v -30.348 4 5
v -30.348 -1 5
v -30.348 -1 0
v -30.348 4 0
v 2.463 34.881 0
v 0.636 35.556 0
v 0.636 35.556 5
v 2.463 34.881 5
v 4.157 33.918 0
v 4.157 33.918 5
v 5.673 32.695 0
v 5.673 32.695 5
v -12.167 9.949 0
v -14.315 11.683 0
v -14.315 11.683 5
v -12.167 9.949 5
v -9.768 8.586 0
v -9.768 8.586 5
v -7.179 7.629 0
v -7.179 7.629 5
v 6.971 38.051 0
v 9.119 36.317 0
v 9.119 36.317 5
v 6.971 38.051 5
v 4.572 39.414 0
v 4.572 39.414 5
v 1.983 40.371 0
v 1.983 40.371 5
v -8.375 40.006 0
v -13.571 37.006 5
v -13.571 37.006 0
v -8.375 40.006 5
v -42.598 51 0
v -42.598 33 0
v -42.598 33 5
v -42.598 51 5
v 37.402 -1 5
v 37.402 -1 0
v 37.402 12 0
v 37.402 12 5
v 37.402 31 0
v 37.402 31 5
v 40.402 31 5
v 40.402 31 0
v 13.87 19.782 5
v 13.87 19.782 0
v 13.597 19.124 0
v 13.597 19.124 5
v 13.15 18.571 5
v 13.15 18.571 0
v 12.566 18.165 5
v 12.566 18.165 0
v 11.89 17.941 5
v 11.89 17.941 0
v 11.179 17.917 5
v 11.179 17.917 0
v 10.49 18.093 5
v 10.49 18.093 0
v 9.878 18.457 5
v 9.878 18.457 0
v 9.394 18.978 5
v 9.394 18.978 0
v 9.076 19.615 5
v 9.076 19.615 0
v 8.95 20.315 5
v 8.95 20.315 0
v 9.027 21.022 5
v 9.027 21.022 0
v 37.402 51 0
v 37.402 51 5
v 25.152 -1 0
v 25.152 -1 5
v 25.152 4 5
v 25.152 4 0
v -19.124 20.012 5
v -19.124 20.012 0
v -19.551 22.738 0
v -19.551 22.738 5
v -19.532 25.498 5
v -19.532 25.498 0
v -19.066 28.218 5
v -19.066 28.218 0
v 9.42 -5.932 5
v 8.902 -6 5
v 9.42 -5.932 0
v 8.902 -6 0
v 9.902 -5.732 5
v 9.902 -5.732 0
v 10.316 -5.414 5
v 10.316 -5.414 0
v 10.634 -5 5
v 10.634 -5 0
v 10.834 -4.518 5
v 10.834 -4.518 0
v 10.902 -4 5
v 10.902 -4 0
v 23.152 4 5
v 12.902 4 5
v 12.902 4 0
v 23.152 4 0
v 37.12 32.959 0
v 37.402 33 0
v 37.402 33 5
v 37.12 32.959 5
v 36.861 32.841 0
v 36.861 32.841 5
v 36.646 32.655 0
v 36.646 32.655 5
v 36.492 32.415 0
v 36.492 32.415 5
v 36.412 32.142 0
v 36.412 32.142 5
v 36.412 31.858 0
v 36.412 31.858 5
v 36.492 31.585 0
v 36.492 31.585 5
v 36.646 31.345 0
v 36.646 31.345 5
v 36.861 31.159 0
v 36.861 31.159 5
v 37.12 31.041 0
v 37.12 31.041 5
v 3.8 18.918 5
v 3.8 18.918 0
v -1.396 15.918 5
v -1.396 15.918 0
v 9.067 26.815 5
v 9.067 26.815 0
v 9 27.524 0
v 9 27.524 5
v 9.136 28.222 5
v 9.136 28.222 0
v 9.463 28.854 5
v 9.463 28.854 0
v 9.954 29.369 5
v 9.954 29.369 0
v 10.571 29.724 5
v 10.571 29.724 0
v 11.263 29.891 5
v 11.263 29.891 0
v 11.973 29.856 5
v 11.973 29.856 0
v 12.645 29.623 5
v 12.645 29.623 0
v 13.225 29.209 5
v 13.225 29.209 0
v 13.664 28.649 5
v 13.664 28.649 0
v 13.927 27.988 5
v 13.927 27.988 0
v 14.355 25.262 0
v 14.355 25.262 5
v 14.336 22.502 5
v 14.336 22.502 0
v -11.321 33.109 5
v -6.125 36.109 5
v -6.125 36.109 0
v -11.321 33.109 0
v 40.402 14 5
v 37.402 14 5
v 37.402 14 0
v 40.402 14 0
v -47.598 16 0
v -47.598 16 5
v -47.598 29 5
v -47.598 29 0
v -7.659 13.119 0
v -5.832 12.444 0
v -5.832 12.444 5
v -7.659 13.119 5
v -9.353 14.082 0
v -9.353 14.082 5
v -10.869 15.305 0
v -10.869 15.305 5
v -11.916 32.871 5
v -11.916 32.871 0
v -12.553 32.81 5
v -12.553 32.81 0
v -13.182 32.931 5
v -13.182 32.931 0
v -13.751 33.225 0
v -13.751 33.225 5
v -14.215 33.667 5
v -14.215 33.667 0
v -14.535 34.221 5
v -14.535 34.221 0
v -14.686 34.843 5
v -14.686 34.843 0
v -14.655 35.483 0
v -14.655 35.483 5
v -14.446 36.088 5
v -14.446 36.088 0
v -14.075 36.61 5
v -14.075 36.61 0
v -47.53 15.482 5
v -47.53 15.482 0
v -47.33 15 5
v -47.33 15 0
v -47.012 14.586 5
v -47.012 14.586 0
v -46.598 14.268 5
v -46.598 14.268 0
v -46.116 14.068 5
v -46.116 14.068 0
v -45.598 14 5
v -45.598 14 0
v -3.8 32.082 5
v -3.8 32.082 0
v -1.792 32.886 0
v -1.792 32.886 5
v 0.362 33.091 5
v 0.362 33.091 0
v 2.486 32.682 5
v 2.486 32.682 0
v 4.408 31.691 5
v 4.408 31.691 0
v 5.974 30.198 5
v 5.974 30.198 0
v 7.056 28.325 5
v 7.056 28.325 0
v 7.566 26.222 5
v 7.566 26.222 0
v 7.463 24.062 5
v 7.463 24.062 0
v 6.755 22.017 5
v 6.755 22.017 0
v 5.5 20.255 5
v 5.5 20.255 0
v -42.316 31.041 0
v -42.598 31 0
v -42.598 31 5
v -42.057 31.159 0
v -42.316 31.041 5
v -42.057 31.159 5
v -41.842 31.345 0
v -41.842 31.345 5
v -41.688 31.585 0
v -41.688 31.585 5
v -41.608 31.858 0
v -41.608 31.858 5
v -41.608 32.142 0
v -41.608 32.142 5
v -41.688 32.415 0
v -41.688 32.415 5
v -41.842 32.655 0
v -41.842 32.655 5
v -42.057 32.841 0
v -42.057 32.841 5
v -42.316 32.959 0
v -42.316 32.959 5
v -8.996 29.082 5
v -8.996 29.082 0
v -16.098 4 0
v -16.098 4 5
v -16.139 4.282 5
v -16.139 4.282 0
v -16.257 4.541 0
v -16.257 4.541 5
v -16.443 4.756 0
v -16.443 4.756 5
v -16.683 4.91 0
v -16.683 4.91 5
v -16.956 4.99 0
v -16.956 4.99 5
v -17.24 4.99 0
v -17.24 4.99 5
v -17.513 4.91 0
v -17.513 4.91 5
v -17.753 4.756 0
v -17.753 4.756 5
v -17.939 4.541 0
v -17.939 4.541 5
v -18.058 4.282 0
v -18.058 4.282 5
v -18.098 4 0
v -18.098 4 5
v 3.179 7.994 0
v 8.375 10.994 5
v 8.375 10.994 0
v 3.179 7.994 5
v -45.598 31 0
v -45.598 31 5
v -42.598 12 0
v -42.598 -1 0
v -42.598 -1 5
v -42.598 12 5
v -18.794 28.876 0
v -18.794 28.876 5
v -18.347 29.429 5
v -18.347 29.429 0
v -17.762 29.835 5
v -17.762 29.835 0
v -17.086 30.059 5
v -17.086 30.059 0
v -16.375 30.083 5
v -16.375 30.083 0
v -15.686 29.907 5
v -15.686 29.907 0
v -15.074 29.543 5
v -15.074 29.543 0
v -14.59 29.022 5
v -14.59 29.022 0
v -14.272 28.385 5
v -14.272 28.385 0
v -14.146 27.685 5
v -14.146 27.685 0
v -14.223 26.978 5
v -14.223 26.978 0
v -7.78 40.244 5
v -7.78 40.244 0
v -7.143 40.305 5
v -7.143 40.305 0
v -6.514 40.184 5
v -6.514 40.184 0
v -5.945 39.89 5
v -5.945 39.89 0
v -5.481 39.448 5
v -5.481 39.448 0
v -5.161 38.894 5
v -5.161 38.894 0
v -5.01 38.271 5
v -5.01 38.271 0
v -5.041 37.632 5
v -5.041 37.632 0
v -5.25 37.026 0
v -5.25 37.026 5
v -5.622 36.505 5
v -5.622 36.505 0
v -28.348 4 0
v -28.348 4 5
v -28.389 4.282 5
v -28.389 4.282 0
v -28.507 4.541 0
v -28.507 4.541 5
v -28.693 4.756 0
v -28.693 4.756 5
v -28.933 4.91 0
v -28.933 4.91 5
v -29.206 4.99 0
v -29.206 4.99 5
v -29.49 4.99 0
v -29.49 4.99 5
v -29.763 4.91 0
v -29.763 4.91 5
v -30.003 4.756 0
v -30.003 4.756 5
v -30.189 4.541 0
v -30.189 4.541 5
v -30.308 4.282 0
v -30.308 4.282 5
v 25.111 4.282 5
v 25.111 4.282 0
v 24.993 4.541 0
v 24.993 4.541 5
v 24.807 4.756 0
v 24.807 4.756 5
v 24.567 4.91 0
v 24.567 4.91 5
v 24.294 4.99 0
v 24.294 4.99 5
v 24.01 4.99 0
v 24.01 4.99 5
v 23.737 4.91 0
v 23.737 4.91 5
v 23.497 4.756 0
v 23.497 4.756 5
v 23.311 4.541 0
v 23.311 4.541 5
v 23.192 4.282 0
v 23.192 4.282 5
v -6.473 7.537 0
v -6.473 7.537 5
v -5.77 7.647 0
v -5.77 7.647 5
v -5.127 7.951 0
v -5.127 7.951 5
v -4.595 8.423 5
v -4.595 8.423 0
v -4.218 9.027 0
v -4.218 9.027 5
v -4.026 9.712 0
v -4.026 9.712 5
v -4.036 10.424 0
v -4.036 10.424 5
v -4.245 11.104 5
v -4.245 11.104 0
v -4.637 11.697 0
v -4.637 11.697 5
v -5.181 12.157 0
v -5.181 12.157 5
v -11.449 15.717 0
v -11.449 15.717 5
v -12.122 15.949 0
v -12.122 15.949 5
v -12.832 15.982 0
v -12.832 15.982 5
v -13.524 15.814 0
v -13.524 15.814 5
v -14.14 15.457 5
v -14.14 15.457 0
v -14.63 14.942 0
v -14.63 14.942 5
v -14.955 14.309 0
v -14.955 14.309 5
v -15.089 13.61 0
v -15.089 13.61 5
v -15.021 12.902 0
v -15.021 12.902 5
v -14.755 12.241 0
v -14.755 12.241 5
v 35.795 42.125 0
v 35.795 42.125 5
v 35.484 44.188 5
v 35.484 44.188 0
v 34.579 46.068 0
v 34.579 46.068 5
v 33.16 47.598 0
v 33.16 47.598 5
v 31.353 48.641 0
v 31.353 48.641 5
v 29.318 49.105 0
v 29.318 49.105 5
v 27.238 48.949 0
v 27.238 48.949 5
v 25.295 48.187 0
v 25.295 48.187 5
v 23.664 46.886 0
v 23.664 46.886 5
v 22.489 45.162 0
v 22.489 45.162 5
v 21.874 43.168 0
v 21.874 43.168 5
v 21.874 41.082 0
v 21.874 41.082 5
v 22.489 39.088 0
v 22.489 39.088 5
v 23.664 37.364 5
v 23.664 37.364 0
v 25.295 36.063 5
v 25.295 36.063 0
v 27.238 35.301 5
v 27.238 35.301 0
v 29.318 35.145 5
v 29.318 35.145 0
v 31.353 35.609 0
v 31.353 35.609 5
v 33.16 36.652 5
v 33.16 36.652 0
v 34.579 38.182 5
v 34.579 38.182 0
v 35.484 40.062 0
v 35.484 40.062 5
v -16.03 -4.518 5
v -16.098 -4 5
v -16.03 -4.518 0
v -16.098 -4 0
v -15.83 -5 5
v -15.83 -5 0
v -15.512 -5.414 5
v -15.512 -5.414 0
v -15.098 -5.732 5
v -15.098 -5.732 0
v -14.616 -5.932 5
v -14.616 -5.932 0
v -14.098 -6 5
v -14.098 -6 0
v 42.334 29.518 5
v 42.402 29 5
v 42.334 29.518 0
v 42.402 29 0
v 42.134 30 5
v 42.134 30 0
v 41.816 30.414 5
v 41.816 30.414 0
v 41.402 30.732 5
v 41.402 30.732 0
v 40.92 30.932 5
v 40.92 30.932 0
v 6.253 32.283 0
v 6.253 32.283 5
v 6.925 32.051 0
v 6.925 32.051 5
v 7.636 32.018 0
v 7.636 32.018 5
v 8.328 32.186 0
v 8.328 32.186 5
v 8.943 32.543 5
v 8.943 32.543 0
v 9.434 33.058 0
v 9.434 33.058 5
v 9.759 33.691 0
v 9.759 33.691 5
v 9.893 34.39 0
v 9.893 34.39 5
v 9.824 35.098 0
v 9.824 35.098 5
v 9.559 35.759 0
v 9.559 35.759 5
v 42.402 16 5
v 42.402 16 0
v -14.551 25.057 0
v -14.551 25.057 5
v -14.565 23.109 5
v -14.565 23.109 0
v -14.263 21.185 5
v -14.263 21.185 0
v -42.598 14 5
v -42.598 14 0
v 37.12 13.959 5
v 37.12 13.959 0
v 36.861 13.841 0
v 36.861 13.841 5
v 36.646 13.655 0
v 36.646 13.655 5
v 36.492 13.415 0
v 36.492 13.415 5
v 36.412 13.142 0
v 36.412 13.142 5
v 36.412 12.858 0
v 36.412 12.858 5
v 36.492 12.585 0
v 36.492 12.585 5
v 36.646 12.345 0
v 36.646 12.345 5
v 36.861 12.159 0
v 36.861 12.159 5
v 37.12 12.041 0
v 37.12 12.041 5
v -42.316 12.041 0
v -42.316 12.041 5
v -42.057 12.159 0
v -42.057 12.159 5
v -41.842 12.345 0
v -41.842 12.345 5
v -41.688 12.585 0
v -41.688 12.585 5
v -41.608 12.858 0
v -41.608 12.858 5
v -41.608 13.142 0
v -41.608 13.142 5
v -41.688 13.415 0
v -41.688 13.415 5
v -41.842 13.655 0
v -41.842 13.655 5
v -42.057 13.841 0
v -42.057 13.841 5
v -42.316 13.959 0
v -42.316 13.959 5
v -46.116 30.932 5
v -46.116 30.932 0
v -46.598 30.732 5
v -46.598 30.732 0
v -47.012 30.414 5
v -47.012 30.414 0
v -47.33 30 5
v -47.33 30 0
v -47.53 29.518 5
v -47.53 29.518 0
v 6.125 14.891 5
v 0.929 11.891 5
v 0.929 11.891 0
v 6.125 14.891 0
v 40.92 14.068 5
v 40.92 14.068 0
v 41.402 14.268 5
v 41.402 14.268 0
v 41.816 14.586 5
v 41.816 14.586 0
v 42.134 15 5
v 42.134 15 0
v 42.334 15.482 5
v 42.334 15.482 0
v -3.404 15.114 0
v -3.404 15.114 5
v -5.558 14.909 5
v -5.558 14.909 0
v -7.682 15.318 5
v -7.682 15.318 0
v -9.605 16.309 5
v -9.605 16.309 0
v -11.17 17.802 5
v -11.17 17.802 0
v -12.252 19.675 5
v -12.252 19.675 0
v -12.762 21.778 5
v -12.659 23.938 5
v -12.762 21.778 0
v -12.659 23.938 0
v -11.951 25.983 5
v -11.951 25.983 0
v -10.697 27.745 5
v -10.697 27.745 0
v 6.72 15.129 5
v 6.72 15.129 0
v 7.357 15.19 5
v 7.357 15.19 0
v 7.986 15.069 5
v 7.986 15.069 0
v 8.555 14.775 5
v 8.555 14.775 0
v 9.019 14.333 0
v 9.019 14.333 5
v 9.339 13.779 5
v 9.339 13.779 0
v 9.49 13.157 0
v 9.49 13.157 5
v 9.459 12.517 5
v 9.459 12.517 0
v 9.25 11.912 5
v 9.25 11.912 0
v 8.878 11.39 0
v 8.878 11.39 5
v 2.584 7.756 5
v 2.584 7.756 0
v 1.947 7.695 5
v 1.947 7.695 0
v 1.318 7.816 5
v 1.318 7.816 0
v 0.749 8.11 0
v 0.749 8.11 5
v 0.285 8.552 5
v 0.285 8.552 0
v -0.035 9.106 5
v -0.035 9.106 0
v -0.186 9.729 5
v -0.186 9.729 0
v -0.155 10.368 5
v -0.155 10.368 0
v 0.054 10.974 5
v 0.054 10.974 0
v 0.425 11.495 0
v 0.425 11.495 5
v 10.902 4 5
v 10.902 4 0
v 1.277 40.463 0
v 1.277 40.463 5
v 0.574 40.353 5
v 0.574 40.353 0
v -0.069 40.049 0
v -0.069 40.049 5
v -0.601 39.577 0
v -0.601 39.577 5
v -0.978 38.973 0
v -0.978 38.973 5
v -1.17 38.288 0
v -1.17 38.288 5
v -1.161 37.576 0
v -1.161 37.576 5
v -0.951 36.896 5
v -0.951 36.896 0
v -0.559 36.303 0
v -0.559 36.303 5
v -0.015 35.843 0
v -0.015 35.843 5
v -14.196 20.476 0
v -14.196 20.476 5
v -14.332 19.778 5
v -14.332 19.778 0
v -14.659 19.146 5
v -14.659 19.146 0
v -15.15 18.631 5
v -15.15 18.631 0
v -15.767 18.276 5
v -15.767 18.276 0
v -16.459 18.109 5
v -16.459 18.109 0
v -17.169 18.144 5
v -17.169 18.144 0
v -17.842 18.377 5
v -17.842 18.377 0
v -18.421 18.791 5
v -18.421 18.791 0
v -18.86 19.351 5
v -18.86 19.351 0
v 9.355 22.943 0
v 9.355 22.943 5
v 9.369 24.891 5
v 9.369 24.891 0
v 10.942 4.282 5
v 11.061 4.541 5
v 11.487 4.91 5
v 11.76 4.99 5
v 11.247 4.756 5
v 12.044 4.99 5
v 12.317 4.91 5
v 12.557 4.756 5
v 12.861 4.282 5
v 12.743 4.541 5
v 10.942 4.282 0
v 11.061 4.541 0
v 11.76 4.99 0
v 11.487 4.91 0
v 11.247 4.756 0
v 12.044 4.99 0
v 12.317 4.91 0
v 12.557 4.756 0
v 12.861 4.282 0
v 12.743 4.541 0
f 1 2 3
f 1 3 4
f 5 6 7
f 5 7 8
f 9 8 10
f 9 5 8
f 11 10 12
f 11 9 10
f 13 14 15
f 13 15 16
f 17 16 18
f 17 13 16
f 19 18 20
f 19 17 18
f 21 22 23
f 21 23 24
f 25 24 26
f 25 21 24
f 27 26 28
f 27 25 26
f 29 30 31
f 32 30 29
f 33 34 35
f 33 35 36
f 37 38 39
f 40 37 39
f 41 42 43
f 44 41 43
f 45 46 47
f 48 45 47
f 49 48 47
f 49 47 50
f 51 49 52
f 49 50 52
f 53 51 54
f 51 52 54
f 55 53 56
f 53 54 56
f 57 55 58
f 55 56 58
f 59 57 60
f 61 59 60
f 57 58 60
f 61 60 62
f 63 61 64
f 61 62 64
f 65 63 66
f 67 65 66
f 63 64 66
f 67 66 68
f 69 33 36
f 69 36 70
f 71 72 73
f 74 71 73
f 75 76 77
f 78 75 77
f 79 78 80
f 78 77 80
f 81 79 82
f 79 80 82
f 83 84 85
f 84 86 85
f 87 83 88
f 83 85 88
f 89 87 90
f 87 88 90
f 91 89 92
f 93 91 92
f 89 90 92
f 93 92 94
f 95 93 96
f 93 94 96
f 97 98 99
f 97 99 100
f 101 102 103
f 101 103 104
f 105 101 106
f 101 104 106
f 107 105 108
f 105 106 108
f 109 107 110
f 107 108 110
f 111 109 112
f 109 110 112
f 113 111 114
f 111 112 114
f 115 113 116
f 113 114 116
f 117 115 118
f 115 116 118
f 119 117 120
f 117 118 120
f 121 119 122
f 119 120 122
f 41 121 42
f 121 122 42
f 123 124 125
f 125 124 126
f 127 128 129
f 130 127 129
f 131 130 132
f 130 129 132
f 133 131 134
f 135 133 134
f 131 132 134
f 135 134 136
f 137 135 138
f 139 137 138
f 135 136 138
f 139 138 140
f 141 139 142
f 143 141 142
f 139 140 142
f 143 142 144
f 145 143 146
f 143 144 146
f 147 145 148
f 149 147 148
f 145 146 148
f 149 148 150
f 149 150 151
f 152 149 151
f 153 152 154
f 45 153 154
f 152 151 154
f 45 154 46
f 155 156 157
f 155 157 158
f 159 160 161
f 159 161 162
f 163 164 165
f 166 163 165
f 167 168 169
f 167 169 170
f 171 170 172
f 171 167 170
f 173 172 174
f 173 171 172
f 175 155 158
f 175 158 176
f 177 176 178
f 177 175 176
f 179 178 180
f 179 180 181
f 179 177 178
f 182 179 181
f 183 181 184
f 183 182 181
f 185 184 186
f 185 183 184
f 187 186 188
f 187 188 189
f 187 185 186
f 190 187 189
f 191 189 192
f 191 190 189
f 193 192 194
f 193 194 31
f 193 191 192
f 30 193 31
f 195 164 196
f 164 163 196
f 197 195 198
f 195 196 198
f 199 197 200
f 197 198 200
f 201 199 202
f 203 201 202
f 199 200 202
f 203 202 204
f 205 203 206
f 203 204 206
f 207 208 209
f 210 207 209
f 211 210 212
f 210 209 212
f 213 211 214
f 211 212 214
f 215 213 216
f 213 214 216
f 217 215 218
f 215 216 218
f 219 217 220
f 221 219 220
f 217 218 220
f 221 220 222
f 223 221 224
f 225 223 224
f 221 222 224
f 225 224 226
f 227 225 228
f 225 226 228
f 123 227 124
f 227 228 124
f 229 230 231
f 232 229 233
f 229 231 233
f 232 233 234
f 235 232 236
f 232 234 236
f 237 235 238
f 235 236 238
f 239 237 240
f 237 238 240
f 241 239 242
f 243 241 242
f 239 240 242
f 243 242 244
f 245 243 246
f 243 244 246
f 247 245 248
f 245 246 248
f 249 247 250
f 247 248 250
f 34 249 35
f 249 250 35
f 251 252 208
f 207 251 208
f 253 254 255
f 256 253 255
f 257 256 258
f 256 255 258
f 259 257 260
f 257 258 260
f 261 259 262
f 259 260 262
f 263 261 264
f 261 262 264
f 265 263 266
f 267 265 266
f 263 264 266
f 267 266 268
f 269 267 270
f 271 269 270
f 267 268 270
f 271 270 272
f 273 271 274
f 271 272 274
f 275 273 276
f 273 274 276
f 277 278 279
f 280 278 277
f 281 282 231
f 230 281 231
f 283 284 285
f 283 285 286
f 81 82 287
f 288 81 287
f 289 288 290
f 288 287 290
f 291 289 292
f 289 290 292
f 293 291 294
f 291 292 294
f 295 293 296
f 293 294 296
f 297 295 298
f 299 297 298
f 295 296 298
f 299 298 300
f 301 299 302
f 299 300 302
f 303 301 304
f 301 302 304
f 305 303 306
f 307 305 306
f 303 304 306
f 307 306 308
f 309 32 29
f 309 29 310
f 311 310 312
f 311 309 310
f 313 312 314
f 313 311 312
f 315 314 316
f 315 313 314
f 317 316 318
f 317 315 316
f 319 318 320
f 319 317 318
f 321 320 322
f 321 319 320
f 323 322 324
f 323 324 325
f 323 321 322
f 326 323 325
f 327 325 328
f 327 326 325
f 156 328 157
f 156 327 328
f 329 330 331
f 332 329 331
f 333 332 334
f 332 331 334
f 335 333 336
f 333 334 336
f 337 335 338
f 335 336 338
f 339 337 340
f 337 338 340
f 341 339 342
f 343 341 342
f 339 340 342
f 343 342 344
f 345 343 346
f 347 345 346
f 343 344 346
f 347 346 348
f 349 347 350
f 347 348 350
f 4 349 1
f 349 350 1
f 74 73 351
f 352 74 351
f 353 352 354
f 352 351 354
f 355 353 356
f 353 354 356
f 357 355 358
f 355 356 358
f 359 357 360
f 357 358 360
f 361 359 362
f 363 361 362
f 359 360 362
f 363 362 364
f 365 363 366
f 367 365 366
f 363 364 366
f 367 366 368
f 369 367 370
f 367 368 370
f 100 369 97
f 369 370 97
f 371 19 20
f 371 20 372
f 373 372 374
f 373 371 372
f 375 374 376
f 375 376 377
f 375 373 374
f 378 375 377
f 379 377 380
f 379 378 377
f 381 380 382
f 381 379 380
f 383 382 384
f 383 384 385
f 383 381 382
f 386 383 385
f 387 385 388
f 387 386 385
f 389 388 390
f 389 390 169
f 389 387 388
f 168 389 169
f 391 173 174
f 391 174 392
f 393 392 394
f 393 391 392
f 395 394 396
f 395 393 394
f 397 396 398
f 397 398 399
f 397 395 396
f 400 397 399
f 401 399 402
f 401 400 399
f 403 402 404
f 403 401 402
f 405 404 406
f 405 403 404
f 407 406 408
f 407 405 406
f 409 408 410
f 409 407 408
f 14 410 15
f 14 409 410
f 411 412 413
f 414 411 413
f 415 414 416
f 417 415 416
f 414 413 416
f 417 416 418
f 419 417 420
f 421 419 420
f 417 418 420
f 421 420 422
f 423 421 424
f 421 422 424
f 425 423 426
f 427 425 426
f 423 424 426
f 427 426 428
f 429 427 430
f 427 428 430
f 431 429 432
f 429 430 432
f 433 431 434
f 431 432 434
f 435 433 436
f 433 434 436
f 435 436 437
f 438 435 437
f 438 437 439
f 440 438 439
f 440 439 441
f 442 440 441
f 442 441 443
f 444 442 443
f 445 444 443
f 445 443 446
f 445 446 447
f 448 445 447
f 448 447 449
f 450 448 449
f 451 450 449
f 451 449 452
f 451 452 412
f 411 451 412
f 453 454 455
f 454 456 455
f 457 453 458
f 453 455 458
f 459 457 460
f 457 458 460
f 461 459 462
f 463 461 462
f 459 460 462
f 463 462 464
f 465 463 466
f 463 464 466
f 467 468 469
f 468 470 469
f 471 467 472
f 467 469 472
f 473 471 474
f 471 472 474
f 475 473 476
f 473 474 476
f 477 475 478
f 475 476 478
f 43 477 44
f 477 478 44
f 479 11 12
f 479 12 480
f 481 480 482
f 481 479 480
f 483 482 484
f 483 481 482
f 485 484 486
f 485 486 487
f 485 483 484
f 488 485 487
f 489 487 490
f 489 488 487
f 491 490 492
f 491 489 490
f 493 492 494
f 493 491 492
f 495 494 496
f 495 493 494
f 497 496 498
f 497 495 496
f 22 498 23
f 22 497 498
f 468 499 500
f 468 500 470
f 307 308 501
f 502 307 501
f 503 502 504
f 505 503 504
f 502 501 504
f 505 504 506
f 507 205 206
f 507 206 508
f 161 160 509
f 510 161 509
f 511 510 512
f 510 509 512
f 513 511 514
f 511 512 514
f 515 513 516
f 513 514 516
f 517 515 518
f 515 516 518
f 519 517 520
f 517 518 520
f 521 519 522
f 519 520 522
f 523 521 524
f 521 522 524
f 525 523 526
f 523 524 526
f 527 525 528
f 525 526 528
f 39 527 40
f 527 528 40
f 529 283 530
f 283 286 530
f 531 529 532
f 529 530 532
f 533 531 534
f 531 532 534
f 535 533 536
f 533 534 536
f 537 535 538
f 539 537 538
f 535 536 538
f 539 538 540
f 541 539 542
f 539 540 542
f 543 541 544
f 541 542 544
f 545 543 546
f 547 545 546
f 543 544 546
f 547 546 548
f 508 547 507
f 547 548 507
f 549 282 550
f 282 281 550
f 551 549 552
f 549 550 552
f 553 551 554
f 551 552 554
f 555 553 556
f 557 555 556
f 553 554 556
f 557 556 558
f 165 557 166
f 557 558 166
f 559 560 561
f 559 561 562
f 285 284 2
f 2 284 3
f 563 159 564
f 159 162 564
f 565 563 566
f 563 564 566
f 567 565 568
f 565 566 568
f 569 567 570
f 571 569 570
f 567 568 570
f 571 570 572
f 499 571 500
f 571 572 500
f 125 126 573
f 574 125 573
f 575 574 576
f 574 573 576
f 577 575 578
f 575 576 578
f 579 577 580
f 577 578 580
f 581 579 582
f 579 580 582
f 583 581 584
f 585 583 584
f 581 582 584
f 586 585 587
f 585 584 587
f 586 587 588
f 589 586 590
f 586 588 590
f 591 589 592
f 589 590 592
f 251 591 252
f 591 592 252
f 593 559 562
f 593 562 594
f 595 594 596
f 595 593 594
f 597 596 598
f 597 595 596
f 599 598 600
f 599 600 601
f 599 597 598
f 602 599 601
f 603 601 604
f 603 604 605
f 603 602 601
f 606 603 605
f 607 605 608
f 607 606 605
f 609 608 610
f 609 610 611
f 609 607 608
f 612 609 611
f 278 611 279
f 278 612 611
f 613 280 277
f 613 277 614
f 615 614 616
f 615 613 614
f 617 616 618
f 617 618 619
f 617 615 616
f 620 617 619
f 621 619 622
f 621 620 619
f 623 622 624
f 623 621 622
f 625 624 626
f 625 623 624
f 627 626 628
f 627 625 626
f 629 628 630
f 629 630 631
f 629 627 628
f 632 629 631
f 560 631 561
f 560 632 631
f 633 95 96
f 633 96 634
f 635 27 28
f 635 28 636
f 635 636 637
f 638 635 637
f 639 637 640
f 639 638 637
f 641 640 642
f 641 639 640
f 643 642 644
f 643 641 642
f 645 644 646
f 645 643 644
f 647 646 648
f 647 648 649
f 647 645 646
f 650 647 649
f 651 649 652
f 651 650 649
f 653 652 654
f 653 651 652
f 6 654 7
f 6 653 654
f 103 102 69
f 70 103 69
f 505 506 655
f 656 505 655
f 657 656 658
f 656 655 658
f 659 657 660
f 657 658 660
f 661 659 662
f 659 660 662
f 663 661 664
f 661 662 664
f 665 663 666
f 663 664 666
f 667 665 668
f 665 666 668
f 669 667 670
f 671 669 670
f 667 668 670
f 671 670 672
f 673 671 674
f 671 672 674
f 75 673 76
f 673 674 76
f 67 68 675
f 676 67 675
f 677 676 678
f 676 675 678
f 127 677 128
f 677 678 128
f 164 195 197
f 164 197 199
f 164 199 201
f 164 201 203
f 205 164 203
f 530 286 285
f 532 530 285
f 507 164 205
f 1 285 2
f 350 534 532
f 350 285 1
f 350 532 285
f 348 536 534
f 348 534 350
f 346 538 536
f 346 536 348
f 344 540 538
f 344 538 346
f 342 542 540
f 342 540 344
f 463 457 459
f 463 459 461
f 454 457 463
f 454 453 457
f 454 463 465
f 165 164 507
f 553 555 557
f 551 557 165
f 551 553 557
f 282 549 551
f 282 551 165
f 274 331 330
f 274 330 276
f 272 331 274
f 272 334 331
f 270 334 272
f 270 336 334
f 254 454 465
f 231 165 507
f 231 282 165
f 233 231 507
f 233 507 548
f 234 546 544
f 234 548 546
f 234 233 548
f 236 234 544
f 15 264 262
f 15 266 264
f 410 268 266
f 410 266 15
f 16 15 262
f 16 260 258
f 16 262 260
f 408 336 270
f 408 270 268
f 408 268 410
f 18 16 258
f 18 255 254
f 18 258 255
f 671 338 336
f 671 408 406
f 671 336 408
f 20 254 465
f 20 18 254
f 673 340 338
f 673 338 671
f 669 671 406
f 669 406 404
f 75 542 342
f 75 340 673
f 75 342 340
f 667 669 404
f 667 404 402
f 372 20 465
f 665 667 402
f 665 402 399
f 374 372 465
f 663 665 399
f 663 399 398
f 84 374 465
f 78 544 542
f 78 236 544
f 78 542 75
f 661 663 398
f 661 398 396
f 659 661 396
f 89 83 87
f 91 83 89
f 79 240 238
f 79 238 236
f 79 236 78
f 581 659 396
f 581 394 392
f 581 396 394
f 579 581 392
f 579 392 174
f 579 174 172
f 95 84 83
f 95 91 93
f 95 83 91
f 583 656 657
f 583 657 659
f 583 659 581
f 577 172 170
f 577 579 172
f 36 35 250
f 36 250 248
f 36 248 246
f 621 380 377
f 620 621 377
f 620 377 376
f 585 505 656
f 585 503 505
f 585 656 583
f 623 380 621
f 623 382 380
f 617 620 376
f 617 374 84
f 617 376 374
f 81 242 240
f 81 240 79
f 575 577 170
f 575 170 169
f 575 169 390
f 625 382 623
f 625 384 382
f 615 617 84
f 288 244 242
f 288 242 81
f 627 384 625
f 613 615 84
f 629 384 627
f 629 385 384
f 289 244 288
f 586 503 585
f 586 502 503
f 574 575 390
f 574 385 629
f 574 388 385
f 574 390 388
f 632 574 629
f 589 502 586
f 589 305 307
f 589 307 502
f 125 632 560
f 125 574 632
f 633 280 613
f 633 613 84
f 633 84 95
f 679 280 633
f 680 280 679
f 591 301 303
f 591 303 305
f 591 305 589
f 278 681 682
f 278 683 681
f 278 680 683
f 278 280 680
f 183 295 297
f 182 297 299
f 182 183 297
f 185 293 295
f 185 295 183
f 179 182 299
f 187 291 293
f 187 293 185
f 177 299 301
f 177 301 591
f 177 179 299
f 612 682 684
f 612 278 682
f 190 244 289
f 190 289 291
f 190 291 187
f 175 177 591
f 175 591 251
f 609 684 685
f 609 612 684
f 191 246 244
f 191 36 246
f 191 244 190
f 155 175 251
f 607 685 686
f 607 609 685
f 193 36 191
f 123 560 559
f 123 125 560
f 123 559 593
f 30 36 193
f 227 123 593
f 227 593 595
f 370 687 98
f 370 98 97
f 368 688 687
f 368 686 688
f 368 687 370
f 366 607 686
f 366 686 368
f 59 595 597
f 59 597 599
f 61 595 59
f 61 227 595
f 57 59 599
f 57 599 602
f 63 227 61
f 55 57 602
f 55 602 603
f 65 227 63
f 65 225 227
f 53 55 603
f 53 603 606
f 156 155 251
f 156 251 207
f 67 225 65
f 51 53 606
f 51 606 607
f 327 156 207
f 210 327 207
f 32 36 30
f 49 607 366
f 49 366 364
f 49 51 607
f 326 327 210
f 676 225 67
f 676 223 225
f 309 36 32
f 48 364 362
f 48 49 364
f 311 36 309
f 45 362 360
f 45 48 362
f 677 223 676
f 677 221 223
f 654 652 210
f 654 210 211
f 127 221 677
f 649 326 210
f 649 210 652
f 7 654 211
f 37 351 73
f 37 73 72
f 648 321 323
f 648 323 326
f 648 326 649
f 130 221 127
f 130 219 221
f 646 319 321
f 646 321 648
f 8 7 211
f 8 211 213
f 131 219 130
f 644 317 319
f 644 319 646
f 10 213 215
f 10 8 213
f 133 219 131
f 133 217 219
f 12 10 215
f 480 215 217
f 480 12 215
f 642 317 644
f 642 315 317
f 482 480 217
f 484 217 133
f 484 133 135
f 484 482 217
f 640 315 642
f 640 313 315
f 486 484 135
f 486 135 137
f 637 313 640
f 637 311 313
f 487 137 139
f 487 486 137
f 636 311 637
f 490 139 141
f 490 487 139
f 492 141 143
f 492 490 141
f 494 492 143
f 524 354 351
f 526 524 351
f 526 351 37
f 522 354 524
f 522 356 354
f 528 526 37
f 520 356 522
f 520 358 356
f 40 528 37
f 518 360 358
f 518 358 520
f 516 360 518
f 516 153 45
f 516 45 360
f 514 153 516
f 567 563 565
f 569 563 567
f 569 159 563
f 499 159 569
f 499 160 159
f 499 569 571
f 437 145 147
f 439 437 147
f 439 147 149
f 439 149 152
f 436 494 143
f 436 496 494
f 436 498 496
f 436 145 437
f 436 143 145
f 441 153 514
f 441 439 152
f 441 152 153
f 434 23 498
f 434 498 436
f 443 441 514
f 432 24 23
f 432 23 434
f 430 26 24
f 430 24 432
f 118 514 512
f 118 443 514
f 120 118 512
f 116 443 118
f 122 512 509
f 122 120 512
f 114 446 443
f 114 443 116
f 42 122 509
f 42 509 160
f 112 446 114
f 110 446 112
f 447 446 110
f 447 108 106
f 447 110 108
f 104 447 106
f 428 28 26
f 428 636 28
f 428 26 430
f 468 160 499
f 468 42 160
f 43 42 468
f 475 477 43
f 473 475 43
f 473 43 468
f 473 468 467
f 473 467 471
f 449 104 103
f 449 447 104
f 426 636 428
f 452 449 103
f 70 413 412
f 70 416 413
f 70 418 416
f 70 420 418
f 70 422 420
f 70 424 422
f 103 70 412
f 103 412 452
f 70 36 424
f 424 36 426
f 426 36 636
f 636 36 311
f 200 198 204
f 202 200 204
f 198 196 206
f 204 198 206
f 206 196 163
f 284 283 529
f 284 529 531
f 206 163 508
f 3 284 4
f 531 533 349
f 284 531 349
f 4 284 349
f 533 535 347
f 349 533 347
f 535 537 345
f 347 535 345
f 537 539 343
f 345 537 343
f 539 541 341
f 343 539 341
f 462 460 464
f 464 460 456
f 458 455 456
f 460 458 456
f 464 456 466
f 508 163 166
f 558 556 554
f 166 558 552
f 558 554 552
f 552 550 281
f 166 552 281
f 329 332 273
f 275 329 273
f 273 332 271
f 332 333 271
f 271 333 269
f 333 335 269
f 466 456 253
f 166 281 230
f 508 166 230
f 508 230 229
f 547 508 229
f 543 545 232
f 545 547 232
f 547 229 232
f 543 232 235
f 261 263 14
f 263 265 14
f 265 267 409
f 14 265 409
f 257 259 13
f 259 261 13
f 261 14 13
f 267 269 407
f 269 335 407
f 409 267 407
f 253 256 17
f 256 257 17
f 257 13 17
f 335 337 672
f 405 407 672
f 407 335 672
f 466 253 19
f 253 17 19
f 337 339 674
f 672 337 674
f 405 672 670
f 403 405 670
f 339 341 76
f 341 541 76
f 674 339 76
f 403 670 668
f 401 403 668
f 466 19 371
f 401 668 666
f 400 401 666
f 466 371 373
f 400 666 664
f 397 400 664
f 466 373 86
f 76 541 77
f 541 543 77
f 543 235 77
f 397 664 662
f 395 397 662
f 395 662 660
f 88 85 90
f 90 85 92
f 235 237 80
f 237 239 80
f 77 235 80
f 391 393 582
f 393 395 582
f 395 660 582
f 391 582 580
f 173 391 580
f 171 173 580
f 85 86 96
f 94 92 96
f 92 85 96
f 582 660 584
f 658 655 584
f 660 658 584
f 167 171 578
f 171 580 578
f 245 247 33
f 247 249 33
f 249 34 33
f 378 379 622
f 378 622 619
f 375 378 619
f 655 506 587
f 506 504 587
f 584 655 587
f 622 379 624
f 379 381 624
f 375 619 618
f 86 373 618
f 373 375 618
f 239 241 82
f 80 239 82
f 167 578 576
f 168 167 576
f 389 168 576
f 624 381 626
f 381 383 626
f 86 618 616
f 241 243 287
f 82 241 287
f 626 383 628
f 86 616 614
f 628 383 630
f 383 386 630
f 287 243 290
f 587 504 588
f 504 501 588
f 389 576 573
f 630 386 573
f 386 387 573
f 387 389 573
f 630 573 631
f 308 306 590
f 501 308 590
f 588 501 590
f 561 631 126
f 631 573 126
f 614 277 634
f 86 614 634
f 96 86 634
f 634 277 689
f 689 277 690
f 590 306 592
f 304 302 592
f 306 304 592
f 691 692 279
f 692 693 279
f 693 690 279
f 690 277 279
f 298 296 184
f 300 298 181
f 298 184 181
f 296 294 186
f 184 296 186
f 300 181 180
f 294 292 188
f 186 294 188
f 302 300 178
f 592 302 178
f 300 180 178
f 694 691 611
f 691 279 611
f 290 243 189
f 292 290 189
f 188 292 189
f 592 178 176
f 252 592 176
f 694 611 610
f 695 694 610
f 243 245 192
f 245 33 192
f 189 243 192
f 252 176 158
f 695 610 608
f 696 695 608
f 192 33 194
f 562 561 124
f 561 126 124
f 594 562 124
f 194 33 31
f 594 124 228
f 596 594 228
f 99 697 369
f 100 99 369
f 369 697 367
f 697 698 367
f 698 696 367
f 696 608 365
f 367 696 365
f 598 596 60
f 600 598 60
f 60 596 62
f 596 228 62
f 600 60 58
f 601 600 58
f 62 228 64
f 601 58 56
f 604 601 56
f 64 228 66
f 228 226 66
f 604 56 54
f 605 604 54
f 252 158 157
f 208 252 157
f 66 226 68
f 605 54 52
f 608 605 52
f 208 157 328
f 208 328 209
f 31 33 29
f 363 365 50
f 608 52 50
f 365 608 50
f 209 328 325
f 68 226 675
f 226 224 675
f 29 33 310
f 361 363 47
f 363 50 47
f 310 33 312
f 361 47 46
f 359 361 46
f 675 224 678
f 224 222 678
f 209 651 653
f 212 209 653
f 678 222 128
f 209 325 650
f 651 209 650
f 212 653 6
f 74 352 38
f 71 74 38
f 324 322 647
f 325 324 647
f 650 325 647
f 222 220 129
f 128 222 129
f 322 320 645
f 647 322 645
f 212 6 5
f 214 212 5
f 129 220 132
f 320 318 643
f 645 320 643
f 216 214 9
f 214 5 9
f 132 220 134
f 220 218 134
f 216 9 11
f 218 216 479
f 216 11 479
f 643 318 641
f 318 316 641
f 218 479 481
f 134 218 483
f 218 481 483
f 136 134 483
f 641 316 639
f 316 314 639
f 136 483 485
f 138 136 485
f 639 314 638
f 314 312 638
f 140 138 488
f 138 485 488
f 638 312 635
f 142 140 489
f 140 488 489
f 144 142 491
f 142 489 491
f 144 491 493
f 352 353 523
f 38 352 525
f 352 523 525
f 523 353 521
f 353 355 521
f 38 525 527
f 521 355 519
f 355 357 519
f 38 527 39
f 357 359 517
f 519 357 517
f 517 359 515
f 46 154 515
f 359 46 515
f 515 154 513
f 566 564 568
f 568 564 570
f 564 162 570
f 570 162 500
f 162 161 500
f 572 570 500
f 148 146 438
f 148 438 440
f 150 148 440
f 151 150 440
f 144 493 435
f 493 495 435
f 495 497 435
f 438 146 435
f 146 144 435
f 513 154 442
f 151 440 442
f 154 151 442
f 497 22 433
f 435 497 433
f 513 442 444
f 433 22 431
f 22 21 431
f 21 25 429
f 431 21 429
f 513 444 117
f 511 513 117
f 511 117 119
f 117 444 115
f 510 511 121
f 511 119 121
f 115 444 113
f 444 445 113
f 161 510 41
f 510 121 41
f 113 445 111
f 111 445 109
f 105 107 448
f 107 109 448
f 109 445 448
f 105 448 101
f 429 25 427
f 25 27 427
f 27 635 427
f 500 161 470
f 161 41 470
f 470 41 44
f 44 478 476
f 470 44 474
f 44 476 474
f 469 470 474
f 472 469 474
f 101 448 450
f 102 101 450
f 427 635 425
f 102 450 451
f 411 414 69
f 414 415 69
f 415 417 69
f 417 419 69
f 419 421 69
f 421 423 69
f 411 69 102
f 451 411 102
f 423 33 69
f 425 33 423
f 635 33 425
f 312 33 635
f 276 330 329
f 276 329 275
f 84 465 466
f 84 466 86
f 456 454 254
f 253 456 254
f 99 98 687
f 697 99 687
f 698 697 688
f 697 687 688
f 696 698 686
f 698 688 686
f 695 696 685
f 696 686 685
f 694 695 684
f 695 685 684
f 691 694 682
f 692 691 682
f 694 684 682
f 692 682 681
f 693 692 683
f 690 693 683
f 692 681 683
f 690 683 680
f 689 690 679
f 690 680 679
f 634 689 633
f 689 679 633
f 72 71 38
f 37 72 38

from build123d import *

# Parameters (mm, degrees)
SKETCH_1_W          = 80
SKETCH_1_H          = 52
EXTRUDE_1_DEPTH     = 5
CUT_EXTRUDE_1_DEPTH = 5
SKETCH_3_R          = 7
CUT_EXTRUDE_2_DEPTH = 10
SKETCH_10_W         = 27
SKETCH_10_H         = 5
SKETCH_10_W_2       = 5
SKETCH_10_H_2       = 17
EXTRUDE_3_DEPTH     = 5
SKETCH_11_R         = 1
CUT_EXTRUDE_5_DEPTH = 5
FILLET_1_R          = 2
SKETCH_12_W         = 14.25
SKETCH_12_H         = 5
CUT_EXTRUDE_6_DEPTH = 10
SKETCH_15_R         = 1
CUT_EXTRUDE_7_DEPTH = 10


with BuildPart() as part:
    # 스케치1 → 보스-돌출1 (new body)
    with BuildSketch(Plane.XY):
        with Locations((-2.598076211, 25)):
            Rectangle(SKETCH_1_W, SKETCH_1_H)
        with BuildLine():
            Line((-8.996152423, 29.081793069), (-3.8, 32.081793069))
            ThreePointArc((-3.8, 32.081793069), (6.581793069, 29.3), (3.8, 18.918206931))
            Line((3.8, 18.918206931), (-1.396152423, 15.918206931))
            ThreePointArc((-1.396152423, 15.918206931), (-11.777945491, 18.7), (-8.996152423, 29.081793069))
        make_face(mode=Mode.SUBTRACT)
        with BuildLine():
            ThreePointArc((9.118681917, 36.317368995), (5.799069268, 38.781337822), (1.982863658, 40.371163365))
            ThreePointArc((1.982863658, 40.371163365), (-1.098327994, 38.637306968), (0.635528403, 35.556115316))
            ThreePointArc((0.635528403, 35.556115316), (3.329320598, 34.433885521), (5.672576585, 32.694613408))
            ThreePointArc((5.672576585, 32.694613408), (9.207007044, 32.782938536), (9.118681917, 36.317368995))
        make_face(mode=Mode.SUBTRACT)
        with BuildLine():
            ThreePointArc((13.92745731, 27.988325692), (14.401510584, 23.881472394), (13.870237087, 19.781628618))
            ThreePointArc((13.870237087, 19.781628618), (10.828077575, 17.980166572), (9.026615528, 21.022326083))
            ThreePointArc((9.026615528, 21.022326083), (9.401632115, 23.916333454), (9.067006275, 26.815288723))
            ThreePointArc((9.067006275, 26.815288723), (10.910713308, 29.832032725), (13.92745731, 27.988325692))
        make_face(mode=Mode.SUBTRACT)
        with BuildLine():
            ThreePointArc((-14.31483434, 11.682631005), (-10.995221691, 9.218662178), (-7.179016081, 7.628836635))
            ThreePointArc((-7.179016081, 7.628836635), (-4.097824429, 9.362693032), (-5.831680825, 12.443884684))
            ThreePointArc((-5.831680825, 12.443884684), (-8.52547302, 13.566114479), (-10.868729008, 15.305386592))
            ThreePointArc((-10.868729008, 15.305386592), (-14.403159467, 15.217061464), (-14.31483434, 11.682631005))
        make_face(mode=Mode.SUBTRACT)
        with BuildLine():
            ThreePointArc((-19.123609733, 20.011674308), (-19.597663007, 24.118527606), (-19.066389509, 28.218371382))
            ThreePointArc((-19.066389509, 28.218371382), (-16.024229998, 30.019833428), (-14.222767951, 26.977673917))
            ThreePointArc((-14.222767951, 26.977673917), (-14.597784537, 24.083666546), (-14.263158697, 21.184711277))
            ThreePointArc((-14.263158697, 21.184711277), (-16.106865731, 18.167967275), (-19.123609733, 20.011674308))
        make_face(mode=Mode.SUBTRACT)
    extrude(amount=EXTRUDE_1_DEPTH)

    # 스케치2 → 컷-돌출1 (cut)
    with BuildSketch(Plane.XY.offset(5)):
        with BuildLine():
            Line((8.375, 10.994074487), (3.178847577, 7.994074487))
            ThreePointArc((3.178847577, 7.994074487), (0.105290419, 8.817631645), (0.928847577, 11.891188804))
            Line((0.928847577, 11.891188804), (6.125, 14.891188804))
            ThreePointArc((6.125, 14.891188804), (9.198557159, 14.067631645), (8.375, 10.994074487))
        make_face()
        with BuildLine():
            Line((-6.125, 36.108811196), (-11.321152423, 33.108811196))
            ThreePointArc((-11.321152423, 33.108811196), (-14.394709581, 33.932368355), (-13.571152423, 37.005925513))
            Line((-13.571152423, 37.005925513), (-8.375, 40.005925513))
            ThreePointArc((-8.375, 40.005925513), (-5.301442841, 39.182368355), (-6.125, 36.108811196))
        make_face()
    extrude(amount=-CUT_EXTRUDE_1_DEPTH, mode=Mode.SUBTRACT)

    # 스케치3 → 컷-돌출2 (cut)
    with BuildSketch(Plane.XY.offset(5)):
        with Locations((28.795344676, 42.125)):
            Circle(SKETCH_3_R)
    extrude(amount=-CUT_EXTRUDE_2_DEPTH, mode=Mode.SUBTRACT)

    # 스케치10 → 보스-돌출3 (add)
    with BuildSketch(Plane.XY.offset(5)):
        with Locations((-2.598076211, -3.5)):
            Rectangle(SKETCH_10_W, SKETCH_10_H)
        with Locations((39.901923789, 22.5)):
            Rectangle(SKETCH_10_W_2, SKETCH_10_H_2)
        with Locations((-45.098076211, 22.5)):
            Rectangle(SKETCH_10_W_2, SKETCH_10_H_2)
    extrude(amount=-EXTRUDE_3_DEPTH)

    # 스케치11 → 컷-돌출5 (cut)
    with BuildSketch(Plane.XY.offset(5)):
        with Locations((37.401923789, 32)):
            Circle(SKETCH_11_R)
        with Locations((37.401923789, 13)):
            Circle(SKETCH_11_R)
        with Locations((-42.598076211, 13)):
            Circle(SKETCH_11_R)
        with Locations((-42.598076211, 32)):
            Circle(SKETCH_11_R)
        with Locations((11.901923789, -1)):
            Circle(SKETCH_11_R)
        with Locations((-17.098076211, -1)):
            Circle(SKETCH_11_R)
    extrude(amount=-CUT_EXTRUDE_5_DEPTH, mode=Mode.SUBTRACT)

    # 필렛1
    fillet_1_edges = [part.edges().sort_by_distance(p)[0] for p in [
        (42.401923789, 31, 2.5),
        (42.401923789, 14, 2.5),
        (10.901923789, -6, 2.5),
        (-16.098076211, -6, 2.5),
        (-47.598076211, 14, 2.5),
        (-47.598076211, 31, 2.5),
    ]]
    fillet(fillet_1_edges, radius=FILLET_1_R)

    # 스케치12 → 컷-돌출6 (cut)
    with BuildSketch(Plane.XY.offset(5)):
        with Locations((18.026923789, 1.5)):
            Rectangle(SKETCH_12_W, SKETCH_12_H)
        with Locations((-23.223076211, 1.5)):
            Rectangle(SKETCH_12_W, SKETCH_12_H)
    extrude(amount=-CUT_EXTRUDE_6_DEPTH, mode=Mode.SUBTRACT)

    # 스케치15 → 컷-돌출7 (cut)
    with BuildSketch(Plane.XY.offset(5)):
        with Locations((11.901923789, 4)):
            Circle(SKETCH_15_R)
        with Locations((24.151923789, 4)):
            Circle(SKETCH_15_R)
        with Locations((-17.098076211, 4)):
            Circle(SKETCH_15_R)
        with Locations((-29.348076211, 4)):
            Circle(SKETCH_15_R)
    extrude(amount=-CUT_EXTRUDE_7_DEPTH, mode=Mode.SUBTRACT)


solid = part.part
